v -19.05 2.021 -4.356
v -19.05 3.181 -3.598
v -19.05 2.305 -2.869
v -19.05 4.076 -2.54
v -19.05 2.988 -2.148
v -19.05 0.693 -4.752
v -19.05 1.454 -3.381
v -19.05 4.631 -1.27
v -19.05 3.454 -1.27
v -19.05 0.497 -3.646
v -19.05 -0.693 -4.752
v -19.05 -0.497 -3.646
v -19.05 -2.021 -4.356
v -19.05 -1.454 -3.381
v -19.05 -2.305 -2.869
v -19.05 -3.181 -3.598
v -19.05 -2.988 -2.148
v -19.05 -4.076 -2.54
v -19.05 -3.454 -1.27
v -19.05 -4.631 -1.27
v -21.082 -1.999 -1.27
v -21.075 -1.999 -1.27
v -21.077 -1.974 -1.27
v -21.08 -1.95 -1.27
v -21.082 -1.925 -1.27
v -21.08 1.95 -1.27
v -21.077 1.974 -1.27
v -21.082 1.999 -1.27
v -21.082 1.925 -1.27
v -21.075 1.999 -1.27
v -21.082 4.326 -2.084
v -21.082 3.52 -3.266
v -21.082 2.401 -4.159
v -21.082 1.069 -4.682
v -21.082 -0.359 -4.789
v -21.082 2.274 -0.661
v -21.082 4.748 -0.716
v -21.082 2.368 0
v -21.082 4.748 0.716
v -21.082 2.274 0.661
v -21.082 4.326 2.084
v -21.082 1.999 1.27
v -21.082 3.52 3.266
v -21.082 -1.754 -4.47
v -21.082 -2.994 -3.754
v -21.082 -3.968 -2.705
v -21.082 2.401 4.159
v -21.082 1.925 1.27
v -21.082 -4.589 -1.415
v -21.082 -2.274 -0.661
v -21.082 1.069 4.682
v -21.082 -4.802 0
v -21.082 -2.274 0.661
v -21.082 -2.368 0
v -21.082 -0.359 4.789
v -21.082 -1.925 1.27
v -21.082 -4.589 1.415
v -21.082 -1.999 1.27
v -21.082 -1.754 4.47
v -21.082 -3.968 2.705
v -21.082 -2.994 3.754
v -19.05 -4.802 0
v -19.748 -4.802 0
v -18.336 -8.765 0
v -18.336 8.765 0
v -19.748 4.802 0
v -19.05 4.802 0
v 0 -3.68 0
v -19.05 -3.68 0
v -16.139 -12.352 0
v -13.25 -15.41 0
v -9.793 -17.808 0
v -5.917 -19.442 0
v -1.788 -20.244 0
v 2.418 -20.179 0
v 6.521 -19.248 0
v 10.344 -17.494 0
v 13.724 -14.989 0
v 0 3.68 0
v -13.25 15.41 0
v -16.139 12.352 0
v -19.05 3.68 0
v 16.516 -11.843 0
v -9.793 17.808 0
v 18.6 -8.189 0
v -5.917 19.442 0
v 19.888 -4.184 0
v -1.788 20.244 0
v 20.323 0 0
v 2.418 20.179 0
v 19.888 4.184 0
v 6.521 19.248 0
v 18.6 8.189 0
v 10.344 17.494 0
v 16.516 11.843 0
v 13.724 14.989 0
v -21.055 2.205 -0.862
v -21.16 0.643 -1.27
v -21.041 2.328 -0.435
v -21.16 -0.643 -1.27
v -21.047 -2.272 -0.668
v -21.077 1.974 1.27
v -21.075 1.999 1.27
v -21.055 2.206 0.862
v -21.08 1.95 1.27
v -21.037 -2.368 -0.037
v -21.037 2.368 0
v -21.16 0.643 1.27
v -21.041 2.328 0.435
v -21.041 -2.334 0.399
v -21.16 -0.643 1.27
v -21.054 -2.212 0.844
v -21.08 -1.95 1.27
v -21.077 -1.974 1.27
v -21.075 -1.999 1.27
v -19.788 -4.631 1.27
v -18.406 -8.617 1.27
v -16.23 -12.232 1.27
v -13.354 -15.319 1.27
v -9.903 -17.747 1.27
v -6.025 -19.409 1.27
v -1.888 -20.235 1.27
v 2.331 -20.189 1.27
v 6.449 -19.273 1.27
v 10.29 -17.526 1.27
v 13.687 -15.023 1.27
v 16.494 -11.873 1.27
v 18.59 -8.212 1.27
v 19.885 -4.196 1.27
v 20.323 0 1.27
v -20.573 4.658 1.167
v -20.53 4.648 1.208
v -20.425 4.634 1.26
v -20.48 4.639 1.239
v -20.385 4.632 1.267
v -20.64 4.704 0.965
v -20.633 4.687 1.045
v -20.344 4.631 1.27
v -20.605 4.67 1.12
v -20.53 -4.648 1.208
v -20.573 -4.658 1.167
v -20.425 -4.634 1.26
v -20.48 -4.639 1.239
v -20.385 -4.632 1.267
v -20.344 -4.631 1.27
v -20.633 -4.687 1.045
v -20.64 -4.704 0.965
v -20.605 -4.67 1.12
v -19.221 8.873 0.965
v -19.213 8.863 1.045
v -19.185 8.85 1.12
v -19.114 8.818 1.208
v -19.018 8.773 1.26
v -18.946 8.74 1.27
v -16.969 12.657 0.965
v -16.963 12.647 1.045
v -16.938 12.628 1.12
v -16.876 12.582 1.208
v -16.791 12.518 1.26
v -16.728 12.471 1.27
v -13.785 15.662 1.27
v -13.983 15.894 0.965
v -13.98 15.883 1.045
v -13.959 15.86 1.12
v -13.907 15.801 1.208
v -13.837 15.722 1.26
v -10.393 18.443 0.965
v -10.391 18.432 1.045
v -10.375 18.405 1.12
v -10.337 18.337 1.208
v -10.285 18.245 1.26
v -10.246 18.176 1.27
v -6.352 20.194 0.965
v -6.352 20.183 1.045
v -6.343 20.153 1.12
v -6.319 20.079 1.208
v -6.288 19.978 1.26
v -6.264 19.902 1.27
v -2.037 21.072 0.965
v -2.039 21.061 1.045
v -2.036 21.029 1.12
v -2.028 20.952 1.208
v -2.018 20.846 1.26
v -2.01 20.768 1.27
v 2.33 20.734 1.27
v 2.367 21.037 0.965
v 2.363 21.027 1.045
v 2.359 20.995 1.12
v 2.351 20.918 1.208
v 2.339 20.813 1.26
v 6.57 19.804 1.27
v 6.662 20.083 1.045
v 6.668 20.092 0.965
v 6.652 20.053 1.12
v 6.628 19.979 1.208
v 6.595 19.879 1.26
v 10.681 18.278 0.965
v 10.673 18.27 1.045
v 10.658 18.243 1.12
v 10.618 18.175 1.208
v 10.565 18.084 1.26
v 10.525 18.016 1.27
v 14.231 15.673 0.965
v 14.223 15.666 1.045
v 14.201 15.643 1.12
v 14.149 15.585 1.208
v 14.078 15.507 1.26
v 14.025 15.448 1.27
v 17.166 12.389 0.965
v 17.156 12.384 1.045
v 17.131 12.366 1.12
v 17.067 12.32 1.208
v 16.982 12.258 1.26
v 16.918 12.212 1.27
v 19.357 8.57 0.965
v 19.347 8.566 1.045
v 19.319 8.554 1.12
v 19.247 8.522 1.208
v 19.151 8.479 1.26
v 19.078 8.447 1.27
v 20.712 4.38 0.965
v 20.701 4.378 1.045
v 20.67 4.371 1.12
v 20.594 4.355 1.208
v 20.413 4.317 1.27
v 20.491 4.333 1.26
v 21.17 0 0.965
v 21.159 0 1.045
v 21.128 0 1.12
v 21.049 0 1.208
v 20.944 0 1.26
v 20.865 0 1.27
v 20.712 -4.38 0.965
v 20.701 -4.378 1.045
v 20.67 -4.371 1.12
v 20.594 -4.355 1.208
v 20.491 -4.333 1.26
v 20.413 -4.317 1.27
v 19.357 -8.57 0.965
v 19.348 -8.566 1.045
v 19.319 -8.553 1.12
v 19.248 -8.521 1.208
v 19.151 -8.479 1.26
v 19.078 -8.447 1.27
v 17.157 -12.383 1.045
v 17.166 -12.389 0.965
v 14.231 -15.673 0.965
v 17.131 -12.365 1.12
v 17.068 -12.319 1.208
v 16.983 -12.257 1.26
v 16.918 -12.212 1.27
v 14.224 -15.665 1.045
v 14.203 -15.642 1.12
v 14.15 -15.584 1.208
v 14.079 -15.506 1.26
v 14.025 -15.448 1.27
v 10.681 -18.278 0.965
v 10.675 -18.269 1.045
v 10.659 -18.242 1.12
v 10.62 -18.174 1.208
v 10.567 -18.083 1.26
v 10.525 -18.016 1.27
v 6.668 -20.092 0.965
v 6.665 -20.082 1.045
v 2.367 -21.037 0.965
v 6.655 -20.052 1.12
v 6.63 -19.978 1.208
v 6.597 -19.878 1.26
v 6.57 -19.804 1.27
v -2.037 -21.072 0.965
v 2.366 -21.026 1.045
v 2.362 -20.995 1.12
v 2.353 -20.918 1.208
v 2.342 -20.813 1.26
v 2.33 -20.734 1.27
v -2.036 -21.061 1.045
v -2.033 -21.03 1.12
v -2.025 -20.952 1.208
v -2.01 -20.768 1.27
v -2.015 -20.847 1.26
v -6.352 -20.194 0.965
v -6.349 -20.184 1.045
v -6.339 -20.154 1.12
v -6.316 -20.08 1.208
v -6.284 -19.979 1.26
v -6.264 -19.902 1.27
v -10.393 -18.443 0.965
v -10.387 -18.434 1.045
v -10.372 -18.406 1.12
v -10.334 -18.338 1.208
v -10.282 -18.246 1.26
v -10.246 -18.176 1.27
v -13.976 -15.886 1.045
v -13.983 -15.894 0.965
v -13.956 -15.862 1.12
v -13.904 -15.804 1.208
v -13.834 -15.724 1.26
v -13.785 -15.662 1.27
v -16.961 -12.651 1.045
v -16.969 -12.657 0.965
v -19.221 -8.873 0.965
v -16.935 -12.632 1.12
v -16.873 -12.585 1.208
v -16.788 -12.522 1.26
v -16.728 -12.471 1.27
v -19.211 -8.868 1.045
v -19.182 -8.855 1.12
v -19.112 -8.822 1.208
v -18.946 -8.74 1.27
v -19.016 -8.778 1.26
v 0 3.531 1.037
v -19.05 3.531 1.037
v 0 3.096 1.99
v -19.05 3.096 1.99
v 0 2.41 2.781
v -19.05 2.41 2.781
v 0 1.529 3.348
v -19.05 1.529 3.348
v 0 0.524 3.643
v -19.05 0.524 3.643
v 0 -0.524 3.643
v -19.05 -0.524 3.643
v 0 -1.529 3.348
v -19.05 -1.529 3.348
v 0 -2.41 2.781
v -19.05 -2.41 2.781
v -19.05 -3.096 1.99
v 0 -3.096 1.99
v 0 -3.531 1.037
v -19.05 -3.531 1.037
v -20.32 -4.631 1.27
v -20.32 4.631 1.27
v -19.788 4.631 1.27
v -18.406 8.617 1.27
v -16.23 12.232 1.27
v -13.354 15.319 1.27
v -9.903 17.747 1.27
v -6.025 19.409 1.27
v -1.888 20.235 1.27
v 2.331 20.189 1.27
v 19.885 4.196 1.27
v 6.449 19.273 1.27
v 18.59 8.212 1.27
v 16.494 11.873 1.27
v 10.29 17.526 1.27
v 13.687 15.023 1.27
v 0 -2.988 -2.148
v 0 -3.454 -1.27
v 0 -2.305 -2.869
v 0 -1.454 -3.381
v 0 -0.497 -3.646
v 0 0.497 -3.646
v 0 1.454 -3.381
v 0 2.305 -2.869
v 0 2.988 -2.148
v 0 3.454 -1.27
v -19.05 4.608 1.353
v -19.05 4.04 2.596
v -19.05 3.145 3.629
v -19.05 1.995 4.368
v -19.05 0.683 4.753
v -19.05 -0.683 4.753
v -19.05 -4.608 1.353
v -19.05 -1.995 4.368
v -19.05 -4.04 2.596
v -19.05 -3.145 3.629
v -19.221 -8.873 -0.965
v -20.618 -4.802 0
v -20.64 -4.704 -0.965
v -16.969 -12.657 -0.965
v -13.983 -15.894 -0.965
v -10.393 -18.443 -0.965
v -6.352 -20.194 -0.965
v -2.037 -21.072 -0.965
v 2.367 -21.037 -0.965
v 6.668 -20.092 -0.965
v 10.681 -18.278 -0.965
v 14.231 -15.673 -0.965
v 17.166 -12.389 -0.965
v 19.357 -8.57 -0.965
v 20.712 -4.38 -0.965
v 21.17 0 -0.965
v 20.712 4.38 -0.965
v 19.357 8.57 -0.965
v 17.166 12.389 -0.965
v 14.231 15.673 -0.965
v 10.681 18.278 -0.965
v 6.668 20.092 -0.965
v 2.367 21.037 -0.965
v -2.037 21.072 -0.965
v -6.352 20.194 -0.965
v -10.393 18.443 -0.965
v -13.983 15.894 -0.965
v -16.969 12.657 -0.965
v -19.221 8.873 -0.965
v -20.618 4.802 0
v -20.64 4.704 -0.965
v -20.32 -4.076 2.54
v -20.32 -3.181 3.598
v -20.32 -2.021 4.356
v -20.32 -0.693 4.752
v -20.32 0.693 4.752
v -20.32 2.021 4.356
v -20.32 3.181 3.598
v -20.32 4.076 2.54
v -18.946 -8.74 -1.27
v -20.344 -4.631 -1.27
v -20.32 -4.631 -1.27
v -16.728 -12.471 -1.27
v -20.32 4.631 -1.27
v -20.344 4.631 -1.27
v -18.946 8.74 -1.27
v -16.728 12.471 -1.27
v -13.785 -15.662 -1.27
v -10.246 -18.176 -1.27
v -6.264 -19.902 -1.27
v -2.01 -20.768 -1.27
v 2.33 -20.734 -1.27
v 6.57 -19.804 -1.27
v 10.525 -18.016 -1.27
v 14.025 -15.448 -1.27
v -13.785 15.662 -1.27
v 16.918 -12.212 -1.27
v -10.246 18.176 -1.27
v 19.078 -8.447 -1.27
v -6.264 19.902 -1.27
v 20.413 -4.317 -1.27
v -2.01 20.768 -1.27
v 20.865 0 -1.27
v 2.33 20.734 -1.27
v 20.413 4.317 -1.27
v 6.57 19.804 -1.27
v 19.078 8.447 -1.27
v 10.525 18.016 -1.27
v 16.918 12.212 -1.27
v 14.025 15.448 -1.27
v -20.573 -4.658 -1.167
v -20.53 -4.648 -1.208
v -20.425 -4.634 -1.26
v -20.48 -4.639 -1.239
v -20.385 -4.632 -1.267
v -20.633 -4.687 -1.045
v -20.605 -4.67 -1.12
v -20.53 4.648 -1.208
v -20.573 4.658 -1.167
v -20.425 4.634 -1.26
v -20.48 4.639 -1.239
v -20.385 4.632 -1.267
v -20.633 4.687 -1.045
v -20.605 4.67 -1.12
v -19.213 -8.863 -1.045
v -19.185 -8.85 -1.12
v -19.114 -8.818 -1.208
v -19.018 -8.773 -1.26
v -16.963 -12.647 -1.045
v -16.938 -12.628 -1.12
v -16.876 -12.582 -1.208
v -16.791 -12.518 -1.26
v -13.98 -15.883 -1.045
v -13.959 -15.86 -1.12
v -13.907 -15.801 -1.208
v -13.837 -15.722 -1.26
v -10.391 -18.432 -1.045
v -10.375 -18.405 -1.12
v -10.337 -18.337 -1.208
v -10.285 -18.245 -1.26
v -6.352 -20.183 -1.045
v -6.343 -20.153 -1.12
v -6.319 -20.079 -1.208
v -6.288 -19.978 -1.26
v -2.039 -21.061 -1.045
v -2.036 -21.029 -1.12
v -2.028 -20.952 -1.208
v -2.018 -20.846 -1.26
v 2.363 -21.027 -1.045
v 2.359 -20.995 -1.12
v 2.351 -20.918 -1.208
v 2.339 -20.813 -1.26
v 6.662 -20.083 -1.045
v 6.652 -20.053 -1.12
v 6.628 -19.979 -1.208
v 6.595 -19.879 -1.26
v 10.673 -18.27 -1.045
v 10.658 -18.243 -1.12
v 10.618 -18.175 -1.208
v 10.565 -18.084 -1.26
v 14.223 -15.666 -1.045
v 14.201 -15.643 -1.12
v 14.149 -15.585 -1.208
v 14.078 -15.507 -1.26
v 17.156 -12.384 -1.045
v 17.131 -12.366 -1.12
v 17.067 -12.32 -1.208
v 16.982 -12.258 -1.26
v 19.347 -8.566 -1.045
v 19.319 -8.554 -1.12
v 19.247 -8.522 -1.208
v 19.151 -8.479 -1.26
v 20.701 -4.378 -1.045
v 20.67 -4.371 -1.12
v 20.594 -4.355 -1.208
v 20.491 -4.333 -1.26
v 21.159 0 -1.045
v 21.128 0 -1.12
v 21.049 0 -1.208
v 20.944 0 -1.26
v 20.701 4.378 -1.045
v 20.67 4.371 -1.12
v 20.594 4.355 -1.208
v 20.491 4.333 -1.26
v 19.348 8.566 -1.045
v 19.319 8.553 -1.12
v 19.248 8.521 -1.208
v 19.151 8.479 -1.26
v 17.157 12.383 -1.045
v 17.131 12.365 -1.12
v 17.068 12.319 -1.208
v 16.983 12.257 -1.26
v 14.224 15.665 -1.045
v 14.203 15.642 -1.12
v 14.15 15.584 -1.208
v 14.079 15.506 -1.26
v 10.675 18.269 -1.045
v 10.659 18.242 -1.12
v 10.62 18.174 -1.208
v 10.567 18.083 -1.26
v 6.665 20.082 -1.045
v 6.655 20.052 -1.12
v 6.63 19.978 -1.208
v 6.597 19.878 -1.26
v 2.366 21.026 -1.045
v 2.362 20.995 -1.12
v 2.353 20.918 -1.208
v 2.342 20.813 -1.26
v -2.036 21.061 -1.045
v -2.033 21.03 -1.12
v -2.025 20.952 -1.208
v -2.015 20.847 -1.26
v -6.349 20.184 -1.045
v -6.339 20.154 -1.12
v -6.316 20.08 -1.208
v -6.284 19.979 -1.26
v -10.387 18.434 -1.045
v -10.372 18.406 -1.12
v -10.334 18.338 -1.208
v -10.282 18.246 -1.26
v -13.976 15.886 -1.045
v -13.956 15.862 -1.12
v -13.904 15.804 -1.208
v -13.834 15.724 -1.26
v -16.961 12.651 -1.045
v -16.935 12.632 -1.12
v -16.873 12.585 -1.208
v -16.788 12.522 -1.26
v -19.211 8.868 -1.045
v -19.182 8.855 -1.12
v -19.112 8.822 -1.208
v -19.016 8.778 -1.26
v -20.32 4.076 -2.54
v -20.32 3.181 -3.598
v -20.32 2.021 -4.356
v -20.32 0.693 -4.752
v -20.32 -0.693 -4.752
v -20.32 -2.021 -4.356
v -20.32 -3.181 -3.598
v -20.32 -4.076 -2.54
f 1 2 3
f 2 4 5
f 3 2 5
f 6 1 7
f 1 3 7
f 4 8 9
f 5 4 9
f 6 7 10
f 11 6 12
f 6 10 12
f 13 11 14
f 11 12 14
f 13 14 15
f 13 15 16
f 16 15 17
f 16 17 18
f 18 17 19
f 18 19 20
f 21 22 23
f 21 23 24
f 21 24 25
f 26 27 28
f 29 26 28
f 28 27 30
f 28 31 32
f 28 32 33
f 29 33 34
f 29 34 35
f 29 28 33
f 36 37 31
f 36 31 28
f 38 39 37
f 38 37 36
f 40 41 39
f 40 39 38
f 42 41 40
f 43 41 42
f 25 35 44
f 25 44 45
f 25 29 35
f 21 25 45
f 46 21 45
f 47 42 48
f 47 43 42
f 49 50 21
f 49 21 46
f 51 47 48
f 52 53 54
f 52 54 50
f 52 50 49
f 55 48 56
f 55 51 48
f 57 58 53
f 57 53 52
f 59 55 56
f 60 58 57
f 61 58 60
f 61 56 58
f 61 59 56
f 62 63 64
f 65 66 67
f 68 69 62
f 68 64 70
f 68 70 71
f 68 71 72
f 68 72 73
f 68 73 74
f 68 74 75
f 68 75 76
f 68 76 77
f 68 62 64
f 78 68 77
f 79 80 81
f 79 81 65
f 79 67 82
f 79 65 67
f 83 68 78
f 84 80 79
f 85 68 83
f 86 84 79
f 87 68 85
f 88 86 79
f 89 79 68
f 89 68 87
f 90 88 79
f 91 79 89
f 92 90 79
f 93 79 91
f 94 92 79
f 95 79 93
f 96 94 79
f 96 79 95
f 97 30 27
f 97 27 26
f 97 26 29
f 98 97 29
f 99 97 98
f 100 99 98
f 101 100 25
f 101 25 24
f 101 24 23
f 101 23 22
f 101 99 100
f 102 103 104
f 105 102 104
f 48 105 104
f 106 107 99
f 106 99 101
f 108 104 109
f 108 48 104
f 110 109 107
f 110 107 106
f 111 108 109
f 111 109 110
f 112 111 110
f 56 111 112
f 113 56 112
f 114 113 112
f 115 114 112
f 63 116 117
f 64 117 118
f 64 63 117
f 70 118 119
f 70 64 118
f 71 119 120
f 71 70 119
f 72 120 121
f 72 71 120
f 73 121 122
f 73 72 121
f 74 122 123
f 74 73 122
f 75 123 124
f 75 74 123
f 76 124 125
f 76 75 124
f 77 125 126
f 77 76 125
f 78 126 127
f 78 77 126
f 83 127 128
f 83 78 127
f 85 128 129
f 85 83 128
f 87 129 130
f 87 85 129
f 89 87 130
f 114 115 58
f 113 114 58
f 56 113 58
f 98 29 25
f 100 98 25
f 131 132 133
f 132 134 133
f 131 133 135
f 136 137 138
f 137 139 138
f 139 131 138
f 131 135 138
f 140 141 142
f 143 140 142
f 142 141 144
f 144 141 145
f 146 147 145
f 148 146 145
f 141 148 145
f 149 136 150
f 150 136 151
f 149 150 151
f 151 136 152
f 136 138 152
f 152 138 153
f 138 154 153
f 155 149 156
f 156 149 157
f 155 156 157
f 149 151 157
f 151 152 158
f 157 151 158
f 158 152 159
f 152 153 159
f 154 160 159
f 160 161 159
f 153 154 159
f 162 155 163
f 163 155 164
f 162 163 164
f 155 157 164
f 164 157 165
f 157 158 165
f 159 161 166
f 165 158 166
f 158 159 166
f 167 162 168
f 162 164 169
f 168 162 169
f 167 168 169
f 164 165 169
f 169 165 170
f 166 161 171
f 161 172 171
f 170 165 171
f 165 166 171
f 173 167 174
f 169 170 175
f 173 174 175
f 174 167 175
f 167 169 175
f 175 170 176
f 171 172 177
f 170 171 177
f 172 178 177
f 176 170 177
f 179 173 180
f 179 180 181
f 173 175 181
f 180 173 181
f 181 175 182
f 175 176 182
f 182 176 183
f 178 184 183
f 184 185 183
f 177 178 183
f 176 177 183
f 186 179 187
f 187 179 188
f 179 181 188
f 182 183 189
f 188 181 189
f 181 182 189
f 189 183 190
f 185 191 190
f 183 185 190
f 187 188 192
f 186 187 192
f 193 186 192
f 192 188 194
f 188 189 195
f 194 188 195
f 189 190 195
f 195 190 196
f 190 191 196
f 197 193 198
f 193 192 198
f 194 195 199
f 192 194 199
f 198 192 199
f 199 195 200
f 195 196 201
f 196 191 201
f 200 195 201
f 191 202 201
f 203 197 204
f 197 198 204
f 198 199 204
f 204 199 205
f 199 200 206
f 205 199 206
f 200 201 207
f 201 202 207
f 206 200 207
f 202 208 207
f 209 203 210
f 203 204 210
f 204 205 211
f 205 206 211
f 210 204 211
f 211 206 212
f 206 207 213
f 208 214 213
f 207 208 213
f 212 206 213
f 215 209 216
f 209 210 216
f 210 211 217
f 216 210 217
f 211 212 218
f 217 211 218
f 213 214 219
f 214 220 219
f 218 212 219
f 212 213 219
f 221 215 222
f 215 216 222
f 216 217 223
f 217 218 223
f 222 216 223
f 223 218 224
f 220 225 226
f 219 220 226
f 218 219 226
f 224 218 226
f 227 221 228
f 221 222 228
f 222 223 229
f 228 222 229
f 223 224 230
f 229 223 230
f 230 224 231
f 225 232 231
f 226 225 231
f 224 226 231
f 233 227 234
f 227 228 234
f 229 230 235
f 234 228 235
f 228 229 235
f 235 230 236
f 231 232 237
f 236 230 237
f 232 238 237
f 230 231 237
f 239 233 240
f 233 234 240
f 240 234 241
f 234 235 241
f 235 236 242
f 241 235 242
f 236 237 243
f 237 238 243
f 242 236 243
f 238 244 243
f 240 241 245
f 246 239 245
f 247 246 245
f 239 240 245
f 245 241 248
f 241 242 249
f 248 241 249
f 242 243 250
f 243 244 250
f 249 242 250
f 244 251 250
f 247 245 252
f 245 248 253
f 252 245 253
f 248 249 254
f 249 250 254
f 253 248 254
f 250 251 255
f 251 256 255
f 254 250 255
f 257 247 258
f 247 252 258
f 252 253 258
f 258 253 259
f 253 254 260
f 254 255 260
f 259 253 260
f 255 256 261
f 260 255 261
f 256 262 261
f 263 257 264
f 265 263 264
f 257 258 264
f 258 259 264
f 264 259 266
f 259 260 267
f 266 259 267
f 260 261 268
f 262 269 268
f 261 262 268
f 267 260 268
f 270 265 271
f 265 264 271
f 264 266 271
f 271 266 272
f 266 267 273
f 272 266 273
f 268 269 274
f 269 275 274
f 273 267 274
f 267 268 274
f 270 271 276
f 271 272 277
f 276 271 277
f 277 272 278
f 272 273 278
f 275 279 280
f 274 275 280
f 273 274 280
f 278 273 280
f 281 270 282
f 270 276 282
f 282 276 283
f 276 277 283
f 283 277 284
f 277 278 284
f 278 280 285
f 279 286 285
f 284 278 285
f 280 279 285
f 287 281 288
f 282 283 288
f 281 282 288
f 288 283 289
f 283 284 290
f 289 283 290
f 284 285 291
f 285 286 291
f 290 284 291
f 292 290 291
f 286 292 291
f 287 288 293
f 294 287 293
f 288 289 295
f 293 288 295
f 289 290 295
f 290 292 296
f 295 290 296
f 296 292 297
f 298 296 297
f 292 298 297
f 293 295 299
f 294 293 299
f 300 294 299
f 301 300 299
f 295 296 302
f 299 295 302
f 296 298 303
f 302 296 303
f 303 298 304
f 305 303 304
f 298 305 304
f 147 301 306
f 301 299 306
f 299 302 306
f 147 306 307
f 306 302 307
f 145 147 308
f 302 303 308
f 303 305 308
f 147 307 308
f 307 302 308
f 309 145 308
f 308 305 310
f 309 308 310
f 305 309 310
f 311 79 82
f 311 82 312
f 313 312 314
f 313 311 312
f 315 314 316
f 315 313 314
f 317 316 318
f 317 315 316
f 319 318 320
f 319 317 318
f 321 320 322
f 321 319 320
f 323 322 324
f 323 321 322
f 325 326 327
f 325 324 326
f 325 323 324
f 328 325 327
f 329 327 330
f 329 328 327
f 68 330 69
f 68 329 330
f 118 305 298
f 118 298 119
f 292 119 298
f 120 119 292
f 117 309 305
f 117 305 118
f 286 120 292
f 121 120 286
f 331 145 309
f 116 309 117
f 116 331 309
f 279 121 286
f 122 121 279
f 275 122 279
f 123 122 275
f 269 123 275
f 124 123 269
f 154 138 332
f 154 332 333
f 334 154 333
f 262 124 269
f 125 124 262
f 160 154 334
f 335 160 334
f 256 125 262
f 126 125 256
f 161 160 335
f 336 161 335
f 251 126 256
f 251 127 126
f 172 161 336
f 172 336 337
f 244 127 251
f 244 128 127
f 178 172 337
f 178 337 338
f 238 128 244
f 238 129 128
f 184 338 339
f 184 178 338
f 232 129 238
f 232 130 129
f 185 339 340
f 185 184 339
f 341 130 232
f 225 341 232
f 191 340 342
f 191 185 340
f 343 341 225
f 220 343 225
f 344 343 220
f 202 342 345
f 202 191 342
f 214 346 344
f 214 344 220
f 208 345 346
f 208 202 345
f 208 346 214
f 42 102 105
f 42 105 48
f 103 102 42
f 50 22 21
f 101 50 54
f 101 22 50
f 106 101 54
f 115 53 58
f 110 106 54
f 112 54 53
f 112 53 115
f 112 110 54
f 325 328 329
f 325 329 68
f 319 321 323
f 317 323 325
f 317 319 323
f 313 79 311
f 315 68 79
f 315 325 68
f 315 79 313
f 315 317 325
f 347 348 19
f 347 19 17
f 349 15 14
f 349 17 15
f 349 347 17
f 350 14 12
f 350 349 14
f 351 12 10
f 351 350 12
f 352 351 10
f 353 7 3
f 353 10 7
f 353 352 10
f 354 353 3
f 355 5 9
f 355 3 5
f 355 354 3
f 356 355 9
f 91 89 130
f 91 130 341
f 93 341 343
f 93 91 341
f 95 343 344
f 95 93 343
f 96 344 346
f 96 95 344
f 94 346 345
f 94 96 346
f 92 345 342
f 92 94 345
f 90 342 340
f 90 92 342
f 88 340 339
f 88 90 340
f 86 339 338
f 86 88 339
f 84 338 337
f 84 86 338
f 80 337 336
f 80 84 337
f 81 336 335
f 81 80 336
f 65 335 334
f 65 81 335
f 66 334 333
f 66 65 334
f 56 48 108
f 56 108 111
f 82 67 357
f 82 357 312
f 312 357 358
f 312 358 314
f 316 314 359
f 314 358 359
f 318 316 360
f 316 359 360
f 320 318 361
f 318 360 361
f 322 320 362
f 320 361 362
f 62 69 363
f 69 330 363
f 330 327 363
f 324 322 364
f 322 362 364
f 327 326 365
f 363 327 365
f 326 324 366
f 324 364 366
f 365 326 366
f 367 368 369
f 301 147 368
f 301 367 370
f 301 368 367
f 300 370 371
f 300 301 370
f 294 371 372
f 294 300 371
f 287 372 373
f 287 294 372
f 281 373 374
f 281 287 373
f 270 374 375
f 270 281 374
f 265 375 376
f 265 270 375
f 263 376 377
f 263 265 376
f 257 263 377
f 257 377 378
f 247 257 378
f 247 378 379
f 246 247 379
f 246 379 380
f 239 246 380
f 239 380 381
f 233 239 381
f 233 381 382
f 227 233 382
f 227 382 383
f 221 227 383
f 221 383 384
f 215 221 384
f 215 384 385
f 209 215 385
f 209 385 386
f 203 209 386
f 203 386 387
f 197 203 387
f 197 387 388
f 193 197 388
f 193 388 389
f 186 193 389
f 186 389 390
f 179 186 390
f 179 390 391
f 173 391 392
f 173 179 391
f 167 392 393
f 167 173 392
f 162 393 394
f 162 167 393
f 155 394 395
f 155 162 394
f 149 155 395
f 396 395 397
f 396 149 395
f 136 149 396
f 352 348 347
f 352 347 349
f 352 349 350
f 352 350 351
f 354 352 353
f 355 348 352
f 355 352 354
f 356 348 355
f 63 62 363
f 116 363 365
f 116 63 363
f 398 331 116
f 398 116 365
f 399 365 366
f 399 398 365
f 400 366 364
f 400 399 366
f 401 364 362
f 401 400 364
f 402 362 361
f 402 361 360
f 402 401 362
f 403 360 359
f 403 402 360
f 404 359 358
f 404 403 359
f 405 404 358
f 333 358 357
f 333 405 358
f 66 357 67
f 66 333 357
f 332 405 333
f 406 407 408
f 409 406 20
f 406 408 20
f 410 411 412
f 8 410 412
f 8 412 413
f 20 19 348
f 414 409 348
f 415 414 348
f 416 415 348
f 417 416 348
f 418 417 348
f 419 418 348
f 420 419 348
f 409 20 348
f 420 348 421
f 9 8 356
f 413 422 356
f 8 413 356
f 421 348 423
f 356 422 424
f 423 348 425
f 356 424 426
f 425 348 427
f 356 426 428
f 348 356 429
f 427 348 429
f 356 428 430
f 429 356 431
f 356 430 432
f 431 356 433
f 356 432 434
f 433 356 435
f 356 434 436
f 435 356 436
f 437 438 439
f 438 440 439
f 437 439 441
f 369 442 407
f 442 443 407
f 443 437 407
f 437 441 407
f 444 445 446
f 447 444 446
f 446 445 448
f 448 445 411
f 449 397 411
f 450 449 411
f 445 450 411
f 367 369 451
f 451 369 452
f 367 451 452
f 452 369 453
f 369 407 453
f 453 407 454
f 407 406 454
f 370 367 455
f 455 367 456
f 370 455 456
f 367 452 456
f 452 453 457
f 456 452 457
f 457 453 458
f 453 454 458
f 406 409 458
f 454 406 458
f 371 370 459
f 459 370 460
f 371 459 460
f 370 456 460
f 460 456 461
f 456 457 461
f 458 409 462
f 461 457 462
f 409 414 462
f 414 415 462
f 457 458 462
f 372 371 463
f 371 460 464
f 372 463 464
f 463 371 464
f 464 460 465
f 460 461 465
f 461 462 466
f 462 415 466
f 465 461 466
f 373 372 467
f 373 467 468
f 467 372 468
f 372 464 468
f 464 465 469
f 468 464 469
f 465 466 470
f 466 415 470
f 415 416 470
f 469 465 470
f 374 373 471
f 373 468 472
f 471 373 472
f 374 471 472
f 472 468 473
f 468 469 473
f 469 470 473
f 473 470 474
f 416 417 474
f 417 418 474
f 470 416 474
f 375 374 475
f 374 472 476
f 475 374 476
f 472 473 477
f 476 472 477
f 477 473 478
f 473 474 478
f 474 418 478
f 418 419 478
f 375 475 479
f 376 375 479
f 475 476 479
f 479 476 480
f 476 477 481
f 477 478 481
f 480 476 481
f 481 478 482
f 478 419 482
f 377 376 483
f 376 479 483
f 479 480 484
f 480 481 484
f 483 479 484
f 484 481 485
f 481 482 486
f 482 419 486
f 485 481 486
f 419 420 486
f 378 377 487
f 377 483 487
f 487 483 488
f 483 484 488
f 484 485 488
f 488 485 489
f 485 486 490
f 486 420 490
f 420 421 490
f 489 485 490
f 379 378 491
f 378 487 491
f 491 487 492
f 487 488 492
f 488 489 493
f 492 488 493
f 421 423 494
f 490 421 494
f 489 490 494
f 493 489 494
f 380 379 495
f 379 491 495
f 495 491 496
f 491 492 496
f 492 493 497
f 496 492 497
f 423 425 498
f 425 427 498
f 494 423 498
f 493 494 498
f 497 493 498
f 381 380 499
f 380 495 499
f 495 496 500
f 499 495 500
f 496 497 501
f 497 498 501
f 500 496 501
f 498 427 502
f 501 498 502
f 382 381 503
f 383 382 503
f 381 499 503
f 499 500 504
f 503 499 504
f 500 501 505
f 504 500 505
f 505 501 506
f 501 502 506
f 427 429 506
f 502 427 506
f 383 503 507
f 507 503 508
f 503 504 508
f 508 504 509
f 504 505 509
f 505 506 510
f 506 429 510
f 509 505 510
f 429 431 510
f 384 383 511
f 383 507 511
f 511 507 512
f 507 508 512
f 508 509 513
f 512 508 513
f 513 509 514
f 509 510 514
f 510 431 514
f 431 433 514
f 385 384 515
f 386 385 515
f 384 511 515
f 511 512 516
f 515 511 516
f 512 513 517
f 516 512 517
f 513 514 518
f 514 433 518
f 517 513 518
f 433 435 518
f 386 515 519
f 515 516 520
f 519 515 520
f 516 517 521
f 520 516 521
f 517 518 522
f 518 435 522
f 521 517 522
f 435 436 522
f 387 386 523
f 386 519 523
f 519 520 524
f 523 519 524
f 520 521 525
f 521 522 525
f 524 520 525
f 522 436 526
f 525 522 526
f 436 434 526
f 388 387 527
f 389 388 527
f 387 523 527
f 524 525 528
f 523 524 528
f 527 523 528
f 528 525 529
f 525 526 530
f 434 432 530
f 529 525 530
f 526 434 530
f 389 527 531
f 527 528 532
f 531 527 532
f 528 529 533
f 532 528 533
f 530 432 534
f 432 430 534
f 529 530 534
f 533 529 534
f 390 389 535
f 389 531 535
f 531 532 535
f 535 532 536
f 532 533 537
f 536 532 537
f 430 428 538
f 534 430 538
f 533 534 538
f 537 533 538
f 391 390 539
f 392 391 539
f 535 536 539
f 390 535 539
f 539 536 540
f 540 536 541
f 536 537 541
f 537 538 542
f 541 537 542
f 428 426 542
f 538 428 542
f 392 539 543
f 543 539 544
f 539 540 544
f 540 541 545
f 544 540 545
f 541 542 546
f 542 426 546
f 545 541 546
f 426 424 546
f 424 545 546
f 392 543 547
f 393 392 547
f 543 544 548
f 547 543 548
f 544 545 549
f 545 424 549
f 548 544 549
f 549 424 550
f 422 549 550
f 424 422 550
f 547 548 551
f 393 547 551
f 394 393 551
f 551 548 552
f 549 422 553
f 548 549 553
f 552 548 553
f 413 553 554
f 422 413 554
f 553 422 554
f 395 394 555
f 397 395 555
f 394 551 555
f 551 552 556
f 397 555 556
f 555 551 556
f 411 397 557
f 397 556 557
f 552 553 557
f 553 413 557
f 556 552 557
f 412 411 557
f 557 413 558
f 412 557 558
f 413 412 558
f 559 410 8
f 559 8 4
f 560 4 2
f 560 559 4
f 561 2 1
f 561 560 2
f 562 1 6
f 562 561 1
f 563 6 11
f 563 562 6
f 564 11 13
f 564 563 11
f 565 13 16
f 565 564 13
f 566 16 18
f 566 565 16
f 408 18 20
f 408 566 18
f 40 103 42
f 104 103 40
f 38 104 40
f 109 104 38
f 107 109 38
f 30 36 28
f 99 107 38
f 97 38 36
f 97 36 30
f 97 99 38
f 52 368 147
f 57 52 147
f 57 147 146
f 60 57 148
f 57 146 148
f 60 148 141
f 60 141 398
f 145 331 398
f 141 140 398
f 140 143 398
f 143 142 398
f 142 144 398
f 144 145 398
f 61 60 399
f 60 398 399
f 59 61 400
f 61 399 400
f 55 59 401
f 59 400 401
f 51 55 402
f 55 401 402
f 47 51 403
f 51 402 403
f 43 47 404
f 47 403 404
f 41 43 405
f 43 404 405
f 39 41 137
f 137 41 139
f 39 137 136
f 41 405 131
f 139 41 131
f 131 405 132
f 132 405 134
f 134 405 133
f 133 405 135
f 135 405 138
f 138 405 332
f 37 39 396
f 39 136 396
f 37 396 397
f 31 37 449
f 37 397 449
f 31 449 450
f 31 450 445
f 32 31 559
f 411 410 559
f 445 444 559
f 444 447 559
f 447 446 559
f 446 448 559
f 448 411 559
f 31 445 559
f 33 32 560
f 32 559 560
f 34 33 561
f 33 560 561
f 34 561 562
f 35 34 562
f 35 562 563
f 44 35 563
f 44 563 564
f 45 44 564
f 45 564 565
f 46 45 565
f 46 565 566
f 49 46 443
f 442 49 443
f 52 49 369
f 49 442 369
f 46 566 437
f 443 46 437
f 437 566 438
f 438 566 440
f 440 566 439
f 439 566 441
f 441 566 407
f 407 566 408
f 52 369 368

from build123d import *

# Parameters (mm, degrees)
F2_R      = 3.6801131425
F3_DEPTH  = 20.32
F4_R      = 4.8020380174
F4_R_2    = 3.6801131425
F5_DEPTH  = 1.27
F6_R      = 4.8020380174
F6_R_2    = 2.3678967055
F7_DEPTH  = 0.762
F9_R      = 21.1697216963
F9_R_2    = 20.3229858377
F10_DEPTH = 1.27
F8_R      = 21.1697216963
F11_DEPTH = 1.27
F12_R     = 0.3048
F13_DEPTH = 0.762


# Not quite as in the source:
# - the program builds the solid bodies; features that only make, move or delete a surface that nothing else refers to are left out


with BuildPart() as f3:
    # F2 (on Right) → F3 (new body)
    with BuildSketch(Plane.YZ):
        Circle(F2_R)
    extrude(amount=-F3_DEPTH)

    # F4 (on face) → F5 (join)
    with BuildSketch(Plane(origin=(-20.32, 0, 0), x_dir=(0, -1, 0), z_dir=(-1, 0, 0))):
        Circle(F4_R)
        Circle(F4_R_2, mode=Mode.SUBTRACT)
    extrude(amount=-F5_DEPTH)

    # F6 (on face) → F7 (join)
    with BuildSketch(Plane(origin=(-20.32, 0, 0), x_dir=(0, -1, 0), z_dir=(-1, 0, 0))):
        Circle(F6_R)
        Circle(F6_R_2, mode=Mode.SUBTRACT)
    extrude(amount=F7_DEPTH)

    # F9 (on face) → F10 (join)
    with BuildSketch(Plane.XY):
        Circle(F9_R)
        Circle(F9_R_2, mode=Mode.SUBTRACT)
    extrude(amount=F10_DEPTH)

    # F8 (on Top) → F11 (join)
    with BuildSketch(Plane.XY):
        Circle(F8_R)
    extrude(amount=-F11_DEPTH)

    # F12
    f12_edges = [f3.edges().sort_by_distance(p)[0] for p in [
        (21.169722, 0, -1.27),
        (21.169722, 0, 1.27),
    ]]
    fillet(f12_edges, radius=F12_R)

    # F13 (add): faces of the model
    f13_faces = [f3.faces().sort_by_distance(p)[0] for p in [
        (-20.32, 0, -1.7192532993),
        (-20.32, 0, 1.4782041027),
    ]]
    extrude(f13_faces, amount=F13_DEPTH)


solid = f3.part
